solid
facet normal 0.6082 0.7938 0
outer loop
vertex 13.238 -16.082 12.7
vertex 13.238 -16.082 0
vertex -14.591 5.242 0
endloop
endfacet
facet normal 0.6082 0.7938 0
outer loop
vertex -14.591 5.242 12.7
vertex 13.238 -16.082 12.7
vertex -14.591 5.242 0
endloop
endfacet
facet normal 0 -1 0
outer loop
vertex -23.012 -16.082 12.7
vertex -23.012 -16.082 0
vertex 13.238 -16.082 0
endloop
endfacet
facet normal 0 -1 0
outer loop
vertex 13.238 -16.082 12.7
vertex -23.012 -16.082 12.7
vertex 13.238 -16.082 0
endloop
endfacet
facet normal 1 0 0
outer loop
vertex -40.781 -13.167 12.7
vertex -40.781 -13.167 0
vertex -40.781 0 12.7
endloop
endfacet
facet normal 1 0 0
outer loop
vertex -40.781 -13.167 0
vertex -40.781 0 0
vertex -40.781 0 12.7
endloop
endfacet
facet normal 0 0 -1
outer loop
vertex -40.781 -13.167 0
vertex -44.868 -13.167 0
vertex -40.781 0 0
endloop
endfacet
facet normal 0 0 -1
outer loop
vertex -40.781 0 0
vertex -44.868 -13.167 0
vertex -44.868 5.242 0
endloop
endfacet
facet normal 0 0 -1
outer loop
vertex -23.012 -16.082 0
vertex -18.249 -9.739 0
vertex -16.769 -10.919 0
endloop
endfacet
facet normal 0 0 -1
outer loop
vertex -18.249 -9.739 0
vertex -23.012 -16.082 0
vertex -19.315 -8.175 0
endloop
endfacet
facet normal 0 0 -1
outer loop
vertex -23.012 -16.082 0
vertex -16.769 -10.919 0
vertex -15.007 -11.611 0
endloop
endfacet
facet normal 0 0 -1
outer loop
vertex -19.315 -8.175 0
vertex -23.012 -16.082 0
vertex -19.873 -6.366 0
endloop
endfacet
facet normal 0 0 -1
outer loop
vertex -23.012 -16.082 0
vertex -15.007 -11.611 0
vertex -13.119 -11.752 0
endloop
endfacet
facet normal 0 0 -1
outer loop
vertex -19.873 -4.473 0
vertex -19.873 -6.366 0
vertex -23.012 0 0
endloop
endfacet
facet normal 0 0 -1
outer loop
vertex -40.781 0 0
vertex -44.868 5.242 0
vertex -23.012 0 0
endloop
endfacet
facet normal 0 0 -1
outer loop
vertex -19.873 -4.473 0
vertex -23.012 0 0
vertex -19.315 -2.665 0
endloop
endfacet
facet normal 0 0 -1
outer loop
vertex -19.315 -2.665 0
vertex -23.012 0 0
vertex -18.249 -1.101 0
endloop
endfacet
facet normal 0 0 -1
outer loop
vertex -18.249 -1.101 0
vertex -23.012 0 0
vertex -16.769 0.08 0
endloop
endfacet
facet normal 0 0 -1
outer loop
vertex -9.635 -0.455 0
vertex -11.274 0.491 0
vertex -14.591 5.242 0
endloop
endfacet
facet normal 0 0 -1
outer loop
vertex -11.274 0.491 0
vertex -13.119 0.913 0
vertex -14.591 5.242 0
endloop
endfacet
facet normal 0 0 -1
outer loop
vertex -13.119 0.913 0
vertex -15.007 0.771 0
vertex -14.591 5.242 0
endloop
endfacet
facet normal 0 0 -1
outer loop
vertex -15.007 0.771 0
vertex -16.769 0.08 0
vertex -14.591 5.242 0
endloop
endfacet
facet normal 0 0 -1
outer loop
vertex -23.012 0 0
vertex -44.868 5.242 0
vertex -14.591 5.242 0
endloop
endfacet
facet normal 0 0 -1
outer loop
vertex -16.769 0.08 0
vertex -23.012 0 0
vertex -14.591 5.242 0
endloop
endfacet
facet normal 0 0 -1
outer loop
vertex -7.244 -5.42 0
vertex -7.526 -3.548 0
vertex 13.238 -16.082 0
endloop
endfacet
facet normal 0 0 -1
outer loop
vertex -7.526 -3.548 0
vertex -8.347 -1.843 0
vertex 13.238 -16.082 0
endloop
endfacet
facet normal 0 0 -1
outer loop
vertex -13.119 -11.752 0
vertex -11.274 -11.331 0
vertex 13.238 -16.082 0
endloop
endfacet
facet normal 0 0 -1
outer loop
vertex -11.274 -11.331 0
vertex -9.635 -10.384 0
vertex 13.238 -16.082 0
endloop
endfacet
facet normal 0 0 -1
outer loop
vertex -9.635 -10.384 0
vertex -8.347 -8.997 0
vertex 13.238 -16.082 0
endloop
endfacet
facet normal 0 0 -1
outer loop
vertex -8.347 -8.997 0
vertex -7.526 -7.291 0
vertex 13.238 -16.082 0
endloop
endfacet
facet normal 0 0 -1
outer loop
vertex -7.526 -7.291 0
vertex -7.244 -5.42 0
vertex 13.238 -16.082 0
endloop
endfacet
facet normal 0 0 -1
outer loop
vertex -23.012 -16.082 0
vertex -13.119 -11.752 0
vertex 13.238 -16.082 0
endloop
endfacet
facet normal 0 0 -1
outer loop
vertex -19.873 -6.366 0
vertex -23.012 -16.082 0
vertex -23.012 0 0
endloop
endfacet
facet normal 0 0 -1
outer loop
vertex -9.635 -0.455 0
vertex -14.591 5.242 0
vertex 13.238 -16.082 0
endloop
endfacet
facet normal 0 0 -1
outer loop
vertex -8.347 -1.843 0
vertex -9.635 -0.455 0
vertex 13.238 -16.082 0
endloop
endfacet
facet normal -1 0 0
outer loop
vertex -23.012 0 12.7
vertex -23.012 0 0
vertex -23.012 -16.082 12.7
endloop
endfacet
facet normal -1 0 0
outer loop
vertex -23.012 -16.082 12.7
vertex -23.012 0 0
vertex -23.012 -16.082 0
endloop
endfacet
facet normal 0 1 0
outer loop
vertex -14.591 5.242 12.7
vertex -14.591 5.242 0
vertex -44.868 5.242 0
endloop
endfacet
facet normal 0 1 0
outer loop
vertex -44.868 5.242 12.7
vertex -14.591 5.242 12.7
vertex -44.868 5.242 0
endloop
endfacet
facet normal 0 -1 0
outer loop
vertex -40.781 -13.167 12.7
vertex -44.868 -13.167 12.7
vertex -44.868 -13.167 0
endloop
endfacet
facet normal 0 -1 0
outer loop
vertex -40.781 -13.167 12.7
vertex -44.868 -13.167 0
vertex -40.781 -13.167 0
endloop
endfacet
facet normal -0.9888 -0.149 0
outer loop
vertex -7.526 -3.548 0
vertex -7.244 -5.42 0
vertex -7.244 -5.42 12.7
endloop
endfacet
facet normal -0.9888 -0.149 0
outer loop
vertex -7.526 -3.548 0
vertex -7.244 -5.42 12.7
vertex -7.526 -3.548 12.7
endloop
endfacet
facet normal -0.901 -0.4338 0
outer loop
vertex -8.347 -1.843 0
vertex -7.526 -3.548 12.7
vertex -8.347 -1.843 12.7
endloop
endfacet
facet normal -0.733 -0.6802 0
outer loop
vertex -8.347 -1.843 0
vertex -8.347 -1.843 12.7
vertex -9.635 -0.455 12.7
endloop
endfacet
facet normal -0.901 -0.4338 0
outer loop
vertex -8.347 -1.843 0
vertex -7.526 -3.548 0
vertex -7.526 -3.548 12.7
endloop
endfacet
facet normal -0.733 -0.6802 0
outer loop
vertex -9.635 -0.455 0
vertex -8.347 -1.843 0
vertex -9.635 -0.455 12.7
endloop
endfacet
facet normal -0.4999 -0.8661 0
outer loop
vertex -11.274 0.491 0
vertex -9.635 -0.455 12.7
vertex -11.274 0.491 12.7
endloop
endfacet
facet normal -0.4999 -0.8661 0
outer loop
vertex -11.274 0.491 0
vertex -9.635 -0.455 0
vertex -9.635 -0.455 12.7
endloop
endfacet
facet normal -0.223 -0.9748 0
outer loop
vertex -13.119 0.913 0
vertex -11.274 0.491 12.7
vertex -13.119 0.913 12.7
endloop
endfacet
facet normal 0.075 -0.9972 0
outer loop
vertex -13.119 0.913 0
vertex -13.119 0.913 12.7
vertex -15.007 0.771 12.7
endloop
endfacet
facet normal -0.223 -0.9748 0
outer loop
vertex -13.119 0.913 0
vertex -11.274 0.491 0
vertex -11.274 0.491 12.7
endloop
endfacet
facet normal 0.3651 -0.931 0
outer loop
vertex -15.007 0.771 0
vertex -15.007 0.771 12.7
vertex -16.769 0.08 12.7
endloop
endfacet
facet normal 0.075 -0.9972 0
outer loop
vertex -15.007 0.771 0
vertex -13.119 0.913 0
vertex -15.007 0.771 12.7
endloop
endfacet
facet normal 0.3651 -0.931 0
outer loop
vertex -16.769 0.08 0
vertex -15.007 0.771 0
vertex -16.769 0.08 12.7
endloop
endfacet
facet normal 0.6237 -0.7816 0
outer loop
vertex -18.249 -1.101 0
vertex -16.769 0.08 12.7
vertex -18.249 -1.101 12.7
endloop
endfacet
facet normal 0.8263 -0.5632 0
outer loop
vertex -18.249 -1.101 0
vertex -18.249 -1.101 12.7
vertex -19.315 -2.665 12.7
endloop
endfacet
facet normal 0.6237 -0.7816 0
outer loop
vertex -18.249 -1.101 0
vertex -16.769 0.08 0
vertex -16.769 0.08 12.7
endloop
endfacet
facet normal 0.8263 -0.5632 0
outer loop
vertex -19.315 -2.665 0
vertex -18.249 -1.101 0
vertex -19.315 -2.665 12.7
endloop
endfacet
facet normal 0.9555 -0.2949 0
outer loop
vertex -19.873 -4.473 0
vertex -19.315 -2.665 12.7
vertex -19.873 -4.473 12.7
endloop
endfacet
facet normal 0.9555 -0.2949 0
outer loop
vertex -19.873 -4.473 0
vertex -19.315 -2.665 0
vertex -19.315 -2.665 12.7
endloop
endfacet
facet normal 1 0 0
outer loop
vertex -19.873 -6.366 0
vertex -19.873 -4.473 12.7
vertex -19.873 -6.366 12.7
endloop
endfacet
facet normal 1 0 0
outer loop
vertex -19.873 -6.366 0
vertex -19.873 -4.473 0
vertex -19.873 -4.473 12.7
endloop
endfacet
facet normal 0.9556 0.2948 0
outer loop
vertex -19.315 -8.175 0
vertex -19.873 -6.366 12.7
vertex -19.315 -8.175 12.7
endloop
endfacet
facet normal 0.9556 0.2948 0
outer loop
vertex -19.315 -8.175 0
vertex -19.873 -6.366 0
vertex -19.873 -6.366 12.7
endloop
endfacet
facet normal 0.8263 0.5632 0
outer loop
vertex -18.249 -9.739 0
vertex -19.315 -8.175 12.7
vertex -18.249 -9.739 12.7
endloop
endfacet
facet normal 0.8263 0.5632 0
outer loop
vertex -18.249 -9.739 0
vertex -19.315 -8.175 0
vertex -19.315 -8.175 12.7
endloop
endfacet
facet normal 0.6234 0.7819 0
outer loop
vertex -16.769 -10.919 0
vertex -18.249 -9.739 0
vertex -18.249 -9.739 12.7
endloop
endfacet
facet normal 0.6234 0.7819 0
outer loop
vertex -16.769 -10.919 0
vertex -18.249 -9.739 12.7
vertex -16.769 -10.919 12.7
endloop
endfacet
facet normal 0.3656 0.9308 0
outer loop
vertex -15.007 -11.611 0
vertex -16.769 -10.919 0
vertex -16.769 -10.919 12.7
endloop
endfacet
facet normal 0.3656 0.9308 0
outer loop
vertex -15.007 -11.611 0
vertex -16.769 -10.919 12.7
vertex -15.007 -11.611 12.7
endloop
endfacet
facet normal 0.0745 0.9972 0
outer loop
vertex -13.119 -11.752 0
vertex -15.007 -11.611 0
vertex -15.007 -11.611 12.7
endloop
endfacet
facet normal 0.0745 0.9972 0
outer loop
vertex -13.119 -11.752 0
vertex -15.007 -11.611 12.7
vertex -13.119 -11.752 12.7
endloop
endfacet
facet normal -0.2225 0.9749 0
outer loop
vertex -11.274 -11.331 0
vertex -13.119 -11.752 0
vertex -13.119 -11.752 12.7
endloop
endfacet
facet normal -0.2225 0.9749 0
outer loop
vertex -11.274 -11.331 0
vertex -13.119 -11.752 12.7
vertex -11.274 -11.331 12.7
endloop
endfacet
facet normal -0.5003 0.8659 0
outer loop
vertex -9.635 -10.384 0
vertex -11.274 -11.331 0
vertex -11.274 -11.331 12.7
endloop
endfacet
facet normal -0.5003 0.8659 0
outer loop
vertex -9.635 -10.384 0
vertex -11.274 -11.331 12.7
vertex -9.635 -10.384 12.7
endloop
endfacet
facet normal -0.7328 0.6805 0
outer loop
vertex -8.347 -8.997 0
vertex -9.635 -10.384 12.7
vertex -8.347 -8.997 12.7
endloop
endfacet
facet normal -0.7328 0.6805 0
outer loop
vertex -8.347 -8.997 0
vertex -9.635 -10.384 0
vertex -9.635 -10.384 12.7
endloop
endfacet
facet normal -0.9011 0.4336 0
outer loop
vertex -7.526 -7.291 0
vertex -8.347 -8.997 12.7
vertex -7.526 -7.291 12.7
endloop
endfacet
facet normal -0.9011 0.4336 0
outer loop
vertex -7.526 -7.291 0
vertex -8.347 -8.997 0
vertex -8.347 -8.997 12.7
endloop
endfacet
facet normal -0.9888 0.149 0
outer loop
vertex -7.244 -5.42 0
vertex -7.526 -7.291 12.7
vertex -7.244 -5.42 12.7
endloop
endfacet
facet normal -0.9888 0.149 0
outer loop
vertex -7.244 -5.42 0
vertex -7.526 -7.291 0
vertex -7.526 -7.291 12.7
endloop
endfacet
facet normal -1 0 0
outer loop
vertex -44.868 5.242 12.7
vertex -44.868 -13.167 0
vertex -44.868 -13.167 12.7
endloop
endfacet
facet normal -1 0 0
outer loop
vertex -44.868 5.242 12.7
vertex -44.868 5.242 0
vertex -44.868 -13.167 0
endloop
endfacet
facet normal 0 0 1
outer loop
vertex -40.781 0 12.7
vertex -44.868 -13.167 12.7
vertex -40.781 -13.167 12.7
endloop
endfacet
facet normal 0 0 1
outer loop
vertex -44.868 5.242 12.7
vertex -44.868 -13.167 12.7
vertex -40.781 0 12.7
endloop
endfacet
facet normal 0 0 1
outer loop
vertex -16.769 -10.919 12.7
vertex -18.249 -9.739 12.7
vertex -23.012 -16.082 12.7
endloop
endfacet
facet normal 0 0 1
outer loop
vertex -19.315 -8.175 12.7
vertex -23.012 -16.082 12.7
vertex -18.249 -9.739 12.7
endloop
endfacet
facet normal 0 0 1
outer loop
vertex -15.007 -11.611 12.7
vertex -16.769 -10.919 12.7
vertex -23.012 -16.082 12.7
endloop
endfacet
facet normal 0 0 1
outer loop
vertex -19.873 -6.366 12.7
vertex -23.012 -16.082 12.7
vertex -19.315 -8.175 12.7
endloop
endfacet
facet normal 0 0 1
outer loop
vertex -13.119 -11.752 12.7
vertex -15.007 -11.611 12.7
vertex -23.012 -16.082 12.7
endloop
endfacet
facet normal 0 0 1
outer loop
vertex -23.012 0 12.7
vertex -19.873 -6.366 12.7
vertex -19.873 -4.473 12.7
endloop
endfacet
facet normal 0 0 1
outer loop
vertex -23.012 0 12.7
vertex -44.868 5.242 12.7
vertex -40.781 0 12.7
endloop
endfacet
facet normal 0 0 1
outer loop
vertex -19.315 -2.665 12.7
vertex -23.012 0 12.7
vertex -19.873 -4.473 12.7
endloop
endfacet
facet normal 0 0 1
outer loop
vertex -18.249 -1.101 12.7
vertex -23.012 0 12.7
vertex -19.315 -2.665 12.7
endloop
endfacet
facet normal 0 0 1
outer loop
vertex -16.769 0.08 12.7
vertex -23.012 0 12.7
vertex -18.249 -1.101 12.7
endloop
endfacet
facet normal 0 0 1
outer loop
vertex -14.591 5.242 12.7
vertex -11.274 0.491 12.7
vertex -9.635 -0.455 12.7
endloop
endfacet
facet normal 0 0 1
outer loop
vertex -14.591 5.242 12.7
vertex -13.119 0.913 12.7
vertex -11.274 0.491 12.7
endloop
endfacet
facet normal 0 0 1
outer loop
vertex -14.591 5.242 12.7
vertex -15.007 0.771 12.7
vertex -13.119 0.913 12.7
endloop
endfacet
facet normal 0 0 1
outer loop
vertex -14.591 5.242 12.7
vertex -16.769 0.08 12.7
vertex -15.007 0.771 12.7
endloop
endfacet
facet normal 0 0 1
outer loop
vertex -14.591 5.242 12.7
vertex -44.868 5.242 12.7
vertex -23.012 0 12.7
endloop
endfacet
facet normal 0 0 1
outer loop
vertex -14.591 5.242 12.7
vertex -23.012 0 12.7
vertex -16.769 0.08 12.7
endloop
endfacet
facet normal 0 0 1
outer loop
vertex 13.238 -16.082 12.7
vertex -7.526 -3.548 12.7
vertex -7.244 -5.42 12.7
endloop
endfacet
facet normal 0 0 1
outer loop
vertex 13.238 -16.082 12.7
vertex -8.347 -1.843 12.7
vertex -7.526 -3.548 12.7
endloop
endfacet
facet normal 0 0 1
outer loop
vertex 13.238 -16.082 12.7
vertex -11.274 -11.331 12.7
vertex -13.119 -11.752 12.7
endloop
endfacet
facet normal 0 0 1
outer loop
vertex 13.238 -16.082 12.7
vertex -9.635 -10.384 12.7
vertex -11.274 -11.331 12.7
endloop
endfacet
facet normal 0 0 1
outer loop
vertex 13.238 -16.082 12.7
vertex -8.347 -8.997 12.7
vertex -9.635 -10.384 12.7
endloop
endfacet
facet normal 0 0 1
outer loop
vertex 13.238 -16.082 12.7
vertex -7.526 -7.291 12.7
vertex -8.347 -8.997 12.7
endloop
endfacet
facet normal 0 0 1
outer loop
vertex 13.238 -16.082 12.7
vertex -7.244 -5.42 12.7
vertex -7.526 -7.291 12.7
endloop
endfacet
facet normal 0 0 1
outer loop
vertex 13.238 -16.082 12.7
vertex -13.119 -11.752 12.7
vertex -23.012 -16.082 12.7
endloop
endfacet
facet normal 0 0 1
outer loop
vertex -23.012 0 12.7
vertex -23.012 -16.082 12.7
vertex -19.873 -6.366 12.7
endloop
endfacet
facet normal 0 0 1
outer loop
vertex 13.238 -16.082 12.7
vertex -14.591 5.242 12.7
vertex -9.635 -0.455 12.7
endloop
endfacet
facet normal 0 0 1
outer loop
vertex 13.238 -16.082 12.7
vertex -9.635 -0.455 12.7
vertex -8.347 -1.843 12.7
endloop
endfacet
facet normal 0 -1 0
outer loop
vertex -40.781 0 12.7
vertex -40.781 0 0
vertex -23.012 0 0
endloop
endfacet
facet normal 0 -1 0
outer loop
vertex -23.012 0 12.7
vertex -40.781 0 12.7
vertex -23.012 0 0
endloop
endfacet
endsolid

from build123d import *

# Parameters (mm, degrees)
F0_R     = 6.35
F1_DEPTH = 12.7
F2_W     = 4.087012
F2_H     = 12.7
F3_DEPTH = 8.8138
F5_DEPTH = 12.701


with BuildPart() as f1:
    # F0 (on Top) → F1 (new body)
    with BuildSketch(Plane.XY):
        Polygon((-44.868298, 5.242039), (-44.868298, 0), (-44.868298, -4.353558), (-40.781286, -4.353558), (-40.781286, 0), (-23.011663, 0), (-23.011663, -16.081509), (13.23837, -16.081509), (13.23837, 5.242039), (-23.011663, 5.242039), (-40.781286, 5.242039), align=None)
        with Locations((-13.593762, -5.419735)):
            Circle(F0_R, mode=Mode.SUBTRACT)
    extrude(amount=F1_DEPTH)

    # F2 (on face) → F3 (join)
    with BuildSketch(Plane.XZ.offset(4.353558)):
        with Locations((-42.824792, 6.35)):
            Rectangle(F2_W, F2_H)
    extrude(amount=F3_DEPTH)

    # F4 (on face) → F5 (cut, through all)
    with BuildSketch(Plane(origin=(0, 0, 0), x_dir=(1, 0, 0), z_dir=(0, 0, -1))):
        Polygon((13.23837, -5.242039), (13.23837, 16.081509), (-14.590898, -5.242039), align=None)
    extrude(amount=-F5_DEPTH, mode=Mode.SUBTRACT)


solid = f1.part
